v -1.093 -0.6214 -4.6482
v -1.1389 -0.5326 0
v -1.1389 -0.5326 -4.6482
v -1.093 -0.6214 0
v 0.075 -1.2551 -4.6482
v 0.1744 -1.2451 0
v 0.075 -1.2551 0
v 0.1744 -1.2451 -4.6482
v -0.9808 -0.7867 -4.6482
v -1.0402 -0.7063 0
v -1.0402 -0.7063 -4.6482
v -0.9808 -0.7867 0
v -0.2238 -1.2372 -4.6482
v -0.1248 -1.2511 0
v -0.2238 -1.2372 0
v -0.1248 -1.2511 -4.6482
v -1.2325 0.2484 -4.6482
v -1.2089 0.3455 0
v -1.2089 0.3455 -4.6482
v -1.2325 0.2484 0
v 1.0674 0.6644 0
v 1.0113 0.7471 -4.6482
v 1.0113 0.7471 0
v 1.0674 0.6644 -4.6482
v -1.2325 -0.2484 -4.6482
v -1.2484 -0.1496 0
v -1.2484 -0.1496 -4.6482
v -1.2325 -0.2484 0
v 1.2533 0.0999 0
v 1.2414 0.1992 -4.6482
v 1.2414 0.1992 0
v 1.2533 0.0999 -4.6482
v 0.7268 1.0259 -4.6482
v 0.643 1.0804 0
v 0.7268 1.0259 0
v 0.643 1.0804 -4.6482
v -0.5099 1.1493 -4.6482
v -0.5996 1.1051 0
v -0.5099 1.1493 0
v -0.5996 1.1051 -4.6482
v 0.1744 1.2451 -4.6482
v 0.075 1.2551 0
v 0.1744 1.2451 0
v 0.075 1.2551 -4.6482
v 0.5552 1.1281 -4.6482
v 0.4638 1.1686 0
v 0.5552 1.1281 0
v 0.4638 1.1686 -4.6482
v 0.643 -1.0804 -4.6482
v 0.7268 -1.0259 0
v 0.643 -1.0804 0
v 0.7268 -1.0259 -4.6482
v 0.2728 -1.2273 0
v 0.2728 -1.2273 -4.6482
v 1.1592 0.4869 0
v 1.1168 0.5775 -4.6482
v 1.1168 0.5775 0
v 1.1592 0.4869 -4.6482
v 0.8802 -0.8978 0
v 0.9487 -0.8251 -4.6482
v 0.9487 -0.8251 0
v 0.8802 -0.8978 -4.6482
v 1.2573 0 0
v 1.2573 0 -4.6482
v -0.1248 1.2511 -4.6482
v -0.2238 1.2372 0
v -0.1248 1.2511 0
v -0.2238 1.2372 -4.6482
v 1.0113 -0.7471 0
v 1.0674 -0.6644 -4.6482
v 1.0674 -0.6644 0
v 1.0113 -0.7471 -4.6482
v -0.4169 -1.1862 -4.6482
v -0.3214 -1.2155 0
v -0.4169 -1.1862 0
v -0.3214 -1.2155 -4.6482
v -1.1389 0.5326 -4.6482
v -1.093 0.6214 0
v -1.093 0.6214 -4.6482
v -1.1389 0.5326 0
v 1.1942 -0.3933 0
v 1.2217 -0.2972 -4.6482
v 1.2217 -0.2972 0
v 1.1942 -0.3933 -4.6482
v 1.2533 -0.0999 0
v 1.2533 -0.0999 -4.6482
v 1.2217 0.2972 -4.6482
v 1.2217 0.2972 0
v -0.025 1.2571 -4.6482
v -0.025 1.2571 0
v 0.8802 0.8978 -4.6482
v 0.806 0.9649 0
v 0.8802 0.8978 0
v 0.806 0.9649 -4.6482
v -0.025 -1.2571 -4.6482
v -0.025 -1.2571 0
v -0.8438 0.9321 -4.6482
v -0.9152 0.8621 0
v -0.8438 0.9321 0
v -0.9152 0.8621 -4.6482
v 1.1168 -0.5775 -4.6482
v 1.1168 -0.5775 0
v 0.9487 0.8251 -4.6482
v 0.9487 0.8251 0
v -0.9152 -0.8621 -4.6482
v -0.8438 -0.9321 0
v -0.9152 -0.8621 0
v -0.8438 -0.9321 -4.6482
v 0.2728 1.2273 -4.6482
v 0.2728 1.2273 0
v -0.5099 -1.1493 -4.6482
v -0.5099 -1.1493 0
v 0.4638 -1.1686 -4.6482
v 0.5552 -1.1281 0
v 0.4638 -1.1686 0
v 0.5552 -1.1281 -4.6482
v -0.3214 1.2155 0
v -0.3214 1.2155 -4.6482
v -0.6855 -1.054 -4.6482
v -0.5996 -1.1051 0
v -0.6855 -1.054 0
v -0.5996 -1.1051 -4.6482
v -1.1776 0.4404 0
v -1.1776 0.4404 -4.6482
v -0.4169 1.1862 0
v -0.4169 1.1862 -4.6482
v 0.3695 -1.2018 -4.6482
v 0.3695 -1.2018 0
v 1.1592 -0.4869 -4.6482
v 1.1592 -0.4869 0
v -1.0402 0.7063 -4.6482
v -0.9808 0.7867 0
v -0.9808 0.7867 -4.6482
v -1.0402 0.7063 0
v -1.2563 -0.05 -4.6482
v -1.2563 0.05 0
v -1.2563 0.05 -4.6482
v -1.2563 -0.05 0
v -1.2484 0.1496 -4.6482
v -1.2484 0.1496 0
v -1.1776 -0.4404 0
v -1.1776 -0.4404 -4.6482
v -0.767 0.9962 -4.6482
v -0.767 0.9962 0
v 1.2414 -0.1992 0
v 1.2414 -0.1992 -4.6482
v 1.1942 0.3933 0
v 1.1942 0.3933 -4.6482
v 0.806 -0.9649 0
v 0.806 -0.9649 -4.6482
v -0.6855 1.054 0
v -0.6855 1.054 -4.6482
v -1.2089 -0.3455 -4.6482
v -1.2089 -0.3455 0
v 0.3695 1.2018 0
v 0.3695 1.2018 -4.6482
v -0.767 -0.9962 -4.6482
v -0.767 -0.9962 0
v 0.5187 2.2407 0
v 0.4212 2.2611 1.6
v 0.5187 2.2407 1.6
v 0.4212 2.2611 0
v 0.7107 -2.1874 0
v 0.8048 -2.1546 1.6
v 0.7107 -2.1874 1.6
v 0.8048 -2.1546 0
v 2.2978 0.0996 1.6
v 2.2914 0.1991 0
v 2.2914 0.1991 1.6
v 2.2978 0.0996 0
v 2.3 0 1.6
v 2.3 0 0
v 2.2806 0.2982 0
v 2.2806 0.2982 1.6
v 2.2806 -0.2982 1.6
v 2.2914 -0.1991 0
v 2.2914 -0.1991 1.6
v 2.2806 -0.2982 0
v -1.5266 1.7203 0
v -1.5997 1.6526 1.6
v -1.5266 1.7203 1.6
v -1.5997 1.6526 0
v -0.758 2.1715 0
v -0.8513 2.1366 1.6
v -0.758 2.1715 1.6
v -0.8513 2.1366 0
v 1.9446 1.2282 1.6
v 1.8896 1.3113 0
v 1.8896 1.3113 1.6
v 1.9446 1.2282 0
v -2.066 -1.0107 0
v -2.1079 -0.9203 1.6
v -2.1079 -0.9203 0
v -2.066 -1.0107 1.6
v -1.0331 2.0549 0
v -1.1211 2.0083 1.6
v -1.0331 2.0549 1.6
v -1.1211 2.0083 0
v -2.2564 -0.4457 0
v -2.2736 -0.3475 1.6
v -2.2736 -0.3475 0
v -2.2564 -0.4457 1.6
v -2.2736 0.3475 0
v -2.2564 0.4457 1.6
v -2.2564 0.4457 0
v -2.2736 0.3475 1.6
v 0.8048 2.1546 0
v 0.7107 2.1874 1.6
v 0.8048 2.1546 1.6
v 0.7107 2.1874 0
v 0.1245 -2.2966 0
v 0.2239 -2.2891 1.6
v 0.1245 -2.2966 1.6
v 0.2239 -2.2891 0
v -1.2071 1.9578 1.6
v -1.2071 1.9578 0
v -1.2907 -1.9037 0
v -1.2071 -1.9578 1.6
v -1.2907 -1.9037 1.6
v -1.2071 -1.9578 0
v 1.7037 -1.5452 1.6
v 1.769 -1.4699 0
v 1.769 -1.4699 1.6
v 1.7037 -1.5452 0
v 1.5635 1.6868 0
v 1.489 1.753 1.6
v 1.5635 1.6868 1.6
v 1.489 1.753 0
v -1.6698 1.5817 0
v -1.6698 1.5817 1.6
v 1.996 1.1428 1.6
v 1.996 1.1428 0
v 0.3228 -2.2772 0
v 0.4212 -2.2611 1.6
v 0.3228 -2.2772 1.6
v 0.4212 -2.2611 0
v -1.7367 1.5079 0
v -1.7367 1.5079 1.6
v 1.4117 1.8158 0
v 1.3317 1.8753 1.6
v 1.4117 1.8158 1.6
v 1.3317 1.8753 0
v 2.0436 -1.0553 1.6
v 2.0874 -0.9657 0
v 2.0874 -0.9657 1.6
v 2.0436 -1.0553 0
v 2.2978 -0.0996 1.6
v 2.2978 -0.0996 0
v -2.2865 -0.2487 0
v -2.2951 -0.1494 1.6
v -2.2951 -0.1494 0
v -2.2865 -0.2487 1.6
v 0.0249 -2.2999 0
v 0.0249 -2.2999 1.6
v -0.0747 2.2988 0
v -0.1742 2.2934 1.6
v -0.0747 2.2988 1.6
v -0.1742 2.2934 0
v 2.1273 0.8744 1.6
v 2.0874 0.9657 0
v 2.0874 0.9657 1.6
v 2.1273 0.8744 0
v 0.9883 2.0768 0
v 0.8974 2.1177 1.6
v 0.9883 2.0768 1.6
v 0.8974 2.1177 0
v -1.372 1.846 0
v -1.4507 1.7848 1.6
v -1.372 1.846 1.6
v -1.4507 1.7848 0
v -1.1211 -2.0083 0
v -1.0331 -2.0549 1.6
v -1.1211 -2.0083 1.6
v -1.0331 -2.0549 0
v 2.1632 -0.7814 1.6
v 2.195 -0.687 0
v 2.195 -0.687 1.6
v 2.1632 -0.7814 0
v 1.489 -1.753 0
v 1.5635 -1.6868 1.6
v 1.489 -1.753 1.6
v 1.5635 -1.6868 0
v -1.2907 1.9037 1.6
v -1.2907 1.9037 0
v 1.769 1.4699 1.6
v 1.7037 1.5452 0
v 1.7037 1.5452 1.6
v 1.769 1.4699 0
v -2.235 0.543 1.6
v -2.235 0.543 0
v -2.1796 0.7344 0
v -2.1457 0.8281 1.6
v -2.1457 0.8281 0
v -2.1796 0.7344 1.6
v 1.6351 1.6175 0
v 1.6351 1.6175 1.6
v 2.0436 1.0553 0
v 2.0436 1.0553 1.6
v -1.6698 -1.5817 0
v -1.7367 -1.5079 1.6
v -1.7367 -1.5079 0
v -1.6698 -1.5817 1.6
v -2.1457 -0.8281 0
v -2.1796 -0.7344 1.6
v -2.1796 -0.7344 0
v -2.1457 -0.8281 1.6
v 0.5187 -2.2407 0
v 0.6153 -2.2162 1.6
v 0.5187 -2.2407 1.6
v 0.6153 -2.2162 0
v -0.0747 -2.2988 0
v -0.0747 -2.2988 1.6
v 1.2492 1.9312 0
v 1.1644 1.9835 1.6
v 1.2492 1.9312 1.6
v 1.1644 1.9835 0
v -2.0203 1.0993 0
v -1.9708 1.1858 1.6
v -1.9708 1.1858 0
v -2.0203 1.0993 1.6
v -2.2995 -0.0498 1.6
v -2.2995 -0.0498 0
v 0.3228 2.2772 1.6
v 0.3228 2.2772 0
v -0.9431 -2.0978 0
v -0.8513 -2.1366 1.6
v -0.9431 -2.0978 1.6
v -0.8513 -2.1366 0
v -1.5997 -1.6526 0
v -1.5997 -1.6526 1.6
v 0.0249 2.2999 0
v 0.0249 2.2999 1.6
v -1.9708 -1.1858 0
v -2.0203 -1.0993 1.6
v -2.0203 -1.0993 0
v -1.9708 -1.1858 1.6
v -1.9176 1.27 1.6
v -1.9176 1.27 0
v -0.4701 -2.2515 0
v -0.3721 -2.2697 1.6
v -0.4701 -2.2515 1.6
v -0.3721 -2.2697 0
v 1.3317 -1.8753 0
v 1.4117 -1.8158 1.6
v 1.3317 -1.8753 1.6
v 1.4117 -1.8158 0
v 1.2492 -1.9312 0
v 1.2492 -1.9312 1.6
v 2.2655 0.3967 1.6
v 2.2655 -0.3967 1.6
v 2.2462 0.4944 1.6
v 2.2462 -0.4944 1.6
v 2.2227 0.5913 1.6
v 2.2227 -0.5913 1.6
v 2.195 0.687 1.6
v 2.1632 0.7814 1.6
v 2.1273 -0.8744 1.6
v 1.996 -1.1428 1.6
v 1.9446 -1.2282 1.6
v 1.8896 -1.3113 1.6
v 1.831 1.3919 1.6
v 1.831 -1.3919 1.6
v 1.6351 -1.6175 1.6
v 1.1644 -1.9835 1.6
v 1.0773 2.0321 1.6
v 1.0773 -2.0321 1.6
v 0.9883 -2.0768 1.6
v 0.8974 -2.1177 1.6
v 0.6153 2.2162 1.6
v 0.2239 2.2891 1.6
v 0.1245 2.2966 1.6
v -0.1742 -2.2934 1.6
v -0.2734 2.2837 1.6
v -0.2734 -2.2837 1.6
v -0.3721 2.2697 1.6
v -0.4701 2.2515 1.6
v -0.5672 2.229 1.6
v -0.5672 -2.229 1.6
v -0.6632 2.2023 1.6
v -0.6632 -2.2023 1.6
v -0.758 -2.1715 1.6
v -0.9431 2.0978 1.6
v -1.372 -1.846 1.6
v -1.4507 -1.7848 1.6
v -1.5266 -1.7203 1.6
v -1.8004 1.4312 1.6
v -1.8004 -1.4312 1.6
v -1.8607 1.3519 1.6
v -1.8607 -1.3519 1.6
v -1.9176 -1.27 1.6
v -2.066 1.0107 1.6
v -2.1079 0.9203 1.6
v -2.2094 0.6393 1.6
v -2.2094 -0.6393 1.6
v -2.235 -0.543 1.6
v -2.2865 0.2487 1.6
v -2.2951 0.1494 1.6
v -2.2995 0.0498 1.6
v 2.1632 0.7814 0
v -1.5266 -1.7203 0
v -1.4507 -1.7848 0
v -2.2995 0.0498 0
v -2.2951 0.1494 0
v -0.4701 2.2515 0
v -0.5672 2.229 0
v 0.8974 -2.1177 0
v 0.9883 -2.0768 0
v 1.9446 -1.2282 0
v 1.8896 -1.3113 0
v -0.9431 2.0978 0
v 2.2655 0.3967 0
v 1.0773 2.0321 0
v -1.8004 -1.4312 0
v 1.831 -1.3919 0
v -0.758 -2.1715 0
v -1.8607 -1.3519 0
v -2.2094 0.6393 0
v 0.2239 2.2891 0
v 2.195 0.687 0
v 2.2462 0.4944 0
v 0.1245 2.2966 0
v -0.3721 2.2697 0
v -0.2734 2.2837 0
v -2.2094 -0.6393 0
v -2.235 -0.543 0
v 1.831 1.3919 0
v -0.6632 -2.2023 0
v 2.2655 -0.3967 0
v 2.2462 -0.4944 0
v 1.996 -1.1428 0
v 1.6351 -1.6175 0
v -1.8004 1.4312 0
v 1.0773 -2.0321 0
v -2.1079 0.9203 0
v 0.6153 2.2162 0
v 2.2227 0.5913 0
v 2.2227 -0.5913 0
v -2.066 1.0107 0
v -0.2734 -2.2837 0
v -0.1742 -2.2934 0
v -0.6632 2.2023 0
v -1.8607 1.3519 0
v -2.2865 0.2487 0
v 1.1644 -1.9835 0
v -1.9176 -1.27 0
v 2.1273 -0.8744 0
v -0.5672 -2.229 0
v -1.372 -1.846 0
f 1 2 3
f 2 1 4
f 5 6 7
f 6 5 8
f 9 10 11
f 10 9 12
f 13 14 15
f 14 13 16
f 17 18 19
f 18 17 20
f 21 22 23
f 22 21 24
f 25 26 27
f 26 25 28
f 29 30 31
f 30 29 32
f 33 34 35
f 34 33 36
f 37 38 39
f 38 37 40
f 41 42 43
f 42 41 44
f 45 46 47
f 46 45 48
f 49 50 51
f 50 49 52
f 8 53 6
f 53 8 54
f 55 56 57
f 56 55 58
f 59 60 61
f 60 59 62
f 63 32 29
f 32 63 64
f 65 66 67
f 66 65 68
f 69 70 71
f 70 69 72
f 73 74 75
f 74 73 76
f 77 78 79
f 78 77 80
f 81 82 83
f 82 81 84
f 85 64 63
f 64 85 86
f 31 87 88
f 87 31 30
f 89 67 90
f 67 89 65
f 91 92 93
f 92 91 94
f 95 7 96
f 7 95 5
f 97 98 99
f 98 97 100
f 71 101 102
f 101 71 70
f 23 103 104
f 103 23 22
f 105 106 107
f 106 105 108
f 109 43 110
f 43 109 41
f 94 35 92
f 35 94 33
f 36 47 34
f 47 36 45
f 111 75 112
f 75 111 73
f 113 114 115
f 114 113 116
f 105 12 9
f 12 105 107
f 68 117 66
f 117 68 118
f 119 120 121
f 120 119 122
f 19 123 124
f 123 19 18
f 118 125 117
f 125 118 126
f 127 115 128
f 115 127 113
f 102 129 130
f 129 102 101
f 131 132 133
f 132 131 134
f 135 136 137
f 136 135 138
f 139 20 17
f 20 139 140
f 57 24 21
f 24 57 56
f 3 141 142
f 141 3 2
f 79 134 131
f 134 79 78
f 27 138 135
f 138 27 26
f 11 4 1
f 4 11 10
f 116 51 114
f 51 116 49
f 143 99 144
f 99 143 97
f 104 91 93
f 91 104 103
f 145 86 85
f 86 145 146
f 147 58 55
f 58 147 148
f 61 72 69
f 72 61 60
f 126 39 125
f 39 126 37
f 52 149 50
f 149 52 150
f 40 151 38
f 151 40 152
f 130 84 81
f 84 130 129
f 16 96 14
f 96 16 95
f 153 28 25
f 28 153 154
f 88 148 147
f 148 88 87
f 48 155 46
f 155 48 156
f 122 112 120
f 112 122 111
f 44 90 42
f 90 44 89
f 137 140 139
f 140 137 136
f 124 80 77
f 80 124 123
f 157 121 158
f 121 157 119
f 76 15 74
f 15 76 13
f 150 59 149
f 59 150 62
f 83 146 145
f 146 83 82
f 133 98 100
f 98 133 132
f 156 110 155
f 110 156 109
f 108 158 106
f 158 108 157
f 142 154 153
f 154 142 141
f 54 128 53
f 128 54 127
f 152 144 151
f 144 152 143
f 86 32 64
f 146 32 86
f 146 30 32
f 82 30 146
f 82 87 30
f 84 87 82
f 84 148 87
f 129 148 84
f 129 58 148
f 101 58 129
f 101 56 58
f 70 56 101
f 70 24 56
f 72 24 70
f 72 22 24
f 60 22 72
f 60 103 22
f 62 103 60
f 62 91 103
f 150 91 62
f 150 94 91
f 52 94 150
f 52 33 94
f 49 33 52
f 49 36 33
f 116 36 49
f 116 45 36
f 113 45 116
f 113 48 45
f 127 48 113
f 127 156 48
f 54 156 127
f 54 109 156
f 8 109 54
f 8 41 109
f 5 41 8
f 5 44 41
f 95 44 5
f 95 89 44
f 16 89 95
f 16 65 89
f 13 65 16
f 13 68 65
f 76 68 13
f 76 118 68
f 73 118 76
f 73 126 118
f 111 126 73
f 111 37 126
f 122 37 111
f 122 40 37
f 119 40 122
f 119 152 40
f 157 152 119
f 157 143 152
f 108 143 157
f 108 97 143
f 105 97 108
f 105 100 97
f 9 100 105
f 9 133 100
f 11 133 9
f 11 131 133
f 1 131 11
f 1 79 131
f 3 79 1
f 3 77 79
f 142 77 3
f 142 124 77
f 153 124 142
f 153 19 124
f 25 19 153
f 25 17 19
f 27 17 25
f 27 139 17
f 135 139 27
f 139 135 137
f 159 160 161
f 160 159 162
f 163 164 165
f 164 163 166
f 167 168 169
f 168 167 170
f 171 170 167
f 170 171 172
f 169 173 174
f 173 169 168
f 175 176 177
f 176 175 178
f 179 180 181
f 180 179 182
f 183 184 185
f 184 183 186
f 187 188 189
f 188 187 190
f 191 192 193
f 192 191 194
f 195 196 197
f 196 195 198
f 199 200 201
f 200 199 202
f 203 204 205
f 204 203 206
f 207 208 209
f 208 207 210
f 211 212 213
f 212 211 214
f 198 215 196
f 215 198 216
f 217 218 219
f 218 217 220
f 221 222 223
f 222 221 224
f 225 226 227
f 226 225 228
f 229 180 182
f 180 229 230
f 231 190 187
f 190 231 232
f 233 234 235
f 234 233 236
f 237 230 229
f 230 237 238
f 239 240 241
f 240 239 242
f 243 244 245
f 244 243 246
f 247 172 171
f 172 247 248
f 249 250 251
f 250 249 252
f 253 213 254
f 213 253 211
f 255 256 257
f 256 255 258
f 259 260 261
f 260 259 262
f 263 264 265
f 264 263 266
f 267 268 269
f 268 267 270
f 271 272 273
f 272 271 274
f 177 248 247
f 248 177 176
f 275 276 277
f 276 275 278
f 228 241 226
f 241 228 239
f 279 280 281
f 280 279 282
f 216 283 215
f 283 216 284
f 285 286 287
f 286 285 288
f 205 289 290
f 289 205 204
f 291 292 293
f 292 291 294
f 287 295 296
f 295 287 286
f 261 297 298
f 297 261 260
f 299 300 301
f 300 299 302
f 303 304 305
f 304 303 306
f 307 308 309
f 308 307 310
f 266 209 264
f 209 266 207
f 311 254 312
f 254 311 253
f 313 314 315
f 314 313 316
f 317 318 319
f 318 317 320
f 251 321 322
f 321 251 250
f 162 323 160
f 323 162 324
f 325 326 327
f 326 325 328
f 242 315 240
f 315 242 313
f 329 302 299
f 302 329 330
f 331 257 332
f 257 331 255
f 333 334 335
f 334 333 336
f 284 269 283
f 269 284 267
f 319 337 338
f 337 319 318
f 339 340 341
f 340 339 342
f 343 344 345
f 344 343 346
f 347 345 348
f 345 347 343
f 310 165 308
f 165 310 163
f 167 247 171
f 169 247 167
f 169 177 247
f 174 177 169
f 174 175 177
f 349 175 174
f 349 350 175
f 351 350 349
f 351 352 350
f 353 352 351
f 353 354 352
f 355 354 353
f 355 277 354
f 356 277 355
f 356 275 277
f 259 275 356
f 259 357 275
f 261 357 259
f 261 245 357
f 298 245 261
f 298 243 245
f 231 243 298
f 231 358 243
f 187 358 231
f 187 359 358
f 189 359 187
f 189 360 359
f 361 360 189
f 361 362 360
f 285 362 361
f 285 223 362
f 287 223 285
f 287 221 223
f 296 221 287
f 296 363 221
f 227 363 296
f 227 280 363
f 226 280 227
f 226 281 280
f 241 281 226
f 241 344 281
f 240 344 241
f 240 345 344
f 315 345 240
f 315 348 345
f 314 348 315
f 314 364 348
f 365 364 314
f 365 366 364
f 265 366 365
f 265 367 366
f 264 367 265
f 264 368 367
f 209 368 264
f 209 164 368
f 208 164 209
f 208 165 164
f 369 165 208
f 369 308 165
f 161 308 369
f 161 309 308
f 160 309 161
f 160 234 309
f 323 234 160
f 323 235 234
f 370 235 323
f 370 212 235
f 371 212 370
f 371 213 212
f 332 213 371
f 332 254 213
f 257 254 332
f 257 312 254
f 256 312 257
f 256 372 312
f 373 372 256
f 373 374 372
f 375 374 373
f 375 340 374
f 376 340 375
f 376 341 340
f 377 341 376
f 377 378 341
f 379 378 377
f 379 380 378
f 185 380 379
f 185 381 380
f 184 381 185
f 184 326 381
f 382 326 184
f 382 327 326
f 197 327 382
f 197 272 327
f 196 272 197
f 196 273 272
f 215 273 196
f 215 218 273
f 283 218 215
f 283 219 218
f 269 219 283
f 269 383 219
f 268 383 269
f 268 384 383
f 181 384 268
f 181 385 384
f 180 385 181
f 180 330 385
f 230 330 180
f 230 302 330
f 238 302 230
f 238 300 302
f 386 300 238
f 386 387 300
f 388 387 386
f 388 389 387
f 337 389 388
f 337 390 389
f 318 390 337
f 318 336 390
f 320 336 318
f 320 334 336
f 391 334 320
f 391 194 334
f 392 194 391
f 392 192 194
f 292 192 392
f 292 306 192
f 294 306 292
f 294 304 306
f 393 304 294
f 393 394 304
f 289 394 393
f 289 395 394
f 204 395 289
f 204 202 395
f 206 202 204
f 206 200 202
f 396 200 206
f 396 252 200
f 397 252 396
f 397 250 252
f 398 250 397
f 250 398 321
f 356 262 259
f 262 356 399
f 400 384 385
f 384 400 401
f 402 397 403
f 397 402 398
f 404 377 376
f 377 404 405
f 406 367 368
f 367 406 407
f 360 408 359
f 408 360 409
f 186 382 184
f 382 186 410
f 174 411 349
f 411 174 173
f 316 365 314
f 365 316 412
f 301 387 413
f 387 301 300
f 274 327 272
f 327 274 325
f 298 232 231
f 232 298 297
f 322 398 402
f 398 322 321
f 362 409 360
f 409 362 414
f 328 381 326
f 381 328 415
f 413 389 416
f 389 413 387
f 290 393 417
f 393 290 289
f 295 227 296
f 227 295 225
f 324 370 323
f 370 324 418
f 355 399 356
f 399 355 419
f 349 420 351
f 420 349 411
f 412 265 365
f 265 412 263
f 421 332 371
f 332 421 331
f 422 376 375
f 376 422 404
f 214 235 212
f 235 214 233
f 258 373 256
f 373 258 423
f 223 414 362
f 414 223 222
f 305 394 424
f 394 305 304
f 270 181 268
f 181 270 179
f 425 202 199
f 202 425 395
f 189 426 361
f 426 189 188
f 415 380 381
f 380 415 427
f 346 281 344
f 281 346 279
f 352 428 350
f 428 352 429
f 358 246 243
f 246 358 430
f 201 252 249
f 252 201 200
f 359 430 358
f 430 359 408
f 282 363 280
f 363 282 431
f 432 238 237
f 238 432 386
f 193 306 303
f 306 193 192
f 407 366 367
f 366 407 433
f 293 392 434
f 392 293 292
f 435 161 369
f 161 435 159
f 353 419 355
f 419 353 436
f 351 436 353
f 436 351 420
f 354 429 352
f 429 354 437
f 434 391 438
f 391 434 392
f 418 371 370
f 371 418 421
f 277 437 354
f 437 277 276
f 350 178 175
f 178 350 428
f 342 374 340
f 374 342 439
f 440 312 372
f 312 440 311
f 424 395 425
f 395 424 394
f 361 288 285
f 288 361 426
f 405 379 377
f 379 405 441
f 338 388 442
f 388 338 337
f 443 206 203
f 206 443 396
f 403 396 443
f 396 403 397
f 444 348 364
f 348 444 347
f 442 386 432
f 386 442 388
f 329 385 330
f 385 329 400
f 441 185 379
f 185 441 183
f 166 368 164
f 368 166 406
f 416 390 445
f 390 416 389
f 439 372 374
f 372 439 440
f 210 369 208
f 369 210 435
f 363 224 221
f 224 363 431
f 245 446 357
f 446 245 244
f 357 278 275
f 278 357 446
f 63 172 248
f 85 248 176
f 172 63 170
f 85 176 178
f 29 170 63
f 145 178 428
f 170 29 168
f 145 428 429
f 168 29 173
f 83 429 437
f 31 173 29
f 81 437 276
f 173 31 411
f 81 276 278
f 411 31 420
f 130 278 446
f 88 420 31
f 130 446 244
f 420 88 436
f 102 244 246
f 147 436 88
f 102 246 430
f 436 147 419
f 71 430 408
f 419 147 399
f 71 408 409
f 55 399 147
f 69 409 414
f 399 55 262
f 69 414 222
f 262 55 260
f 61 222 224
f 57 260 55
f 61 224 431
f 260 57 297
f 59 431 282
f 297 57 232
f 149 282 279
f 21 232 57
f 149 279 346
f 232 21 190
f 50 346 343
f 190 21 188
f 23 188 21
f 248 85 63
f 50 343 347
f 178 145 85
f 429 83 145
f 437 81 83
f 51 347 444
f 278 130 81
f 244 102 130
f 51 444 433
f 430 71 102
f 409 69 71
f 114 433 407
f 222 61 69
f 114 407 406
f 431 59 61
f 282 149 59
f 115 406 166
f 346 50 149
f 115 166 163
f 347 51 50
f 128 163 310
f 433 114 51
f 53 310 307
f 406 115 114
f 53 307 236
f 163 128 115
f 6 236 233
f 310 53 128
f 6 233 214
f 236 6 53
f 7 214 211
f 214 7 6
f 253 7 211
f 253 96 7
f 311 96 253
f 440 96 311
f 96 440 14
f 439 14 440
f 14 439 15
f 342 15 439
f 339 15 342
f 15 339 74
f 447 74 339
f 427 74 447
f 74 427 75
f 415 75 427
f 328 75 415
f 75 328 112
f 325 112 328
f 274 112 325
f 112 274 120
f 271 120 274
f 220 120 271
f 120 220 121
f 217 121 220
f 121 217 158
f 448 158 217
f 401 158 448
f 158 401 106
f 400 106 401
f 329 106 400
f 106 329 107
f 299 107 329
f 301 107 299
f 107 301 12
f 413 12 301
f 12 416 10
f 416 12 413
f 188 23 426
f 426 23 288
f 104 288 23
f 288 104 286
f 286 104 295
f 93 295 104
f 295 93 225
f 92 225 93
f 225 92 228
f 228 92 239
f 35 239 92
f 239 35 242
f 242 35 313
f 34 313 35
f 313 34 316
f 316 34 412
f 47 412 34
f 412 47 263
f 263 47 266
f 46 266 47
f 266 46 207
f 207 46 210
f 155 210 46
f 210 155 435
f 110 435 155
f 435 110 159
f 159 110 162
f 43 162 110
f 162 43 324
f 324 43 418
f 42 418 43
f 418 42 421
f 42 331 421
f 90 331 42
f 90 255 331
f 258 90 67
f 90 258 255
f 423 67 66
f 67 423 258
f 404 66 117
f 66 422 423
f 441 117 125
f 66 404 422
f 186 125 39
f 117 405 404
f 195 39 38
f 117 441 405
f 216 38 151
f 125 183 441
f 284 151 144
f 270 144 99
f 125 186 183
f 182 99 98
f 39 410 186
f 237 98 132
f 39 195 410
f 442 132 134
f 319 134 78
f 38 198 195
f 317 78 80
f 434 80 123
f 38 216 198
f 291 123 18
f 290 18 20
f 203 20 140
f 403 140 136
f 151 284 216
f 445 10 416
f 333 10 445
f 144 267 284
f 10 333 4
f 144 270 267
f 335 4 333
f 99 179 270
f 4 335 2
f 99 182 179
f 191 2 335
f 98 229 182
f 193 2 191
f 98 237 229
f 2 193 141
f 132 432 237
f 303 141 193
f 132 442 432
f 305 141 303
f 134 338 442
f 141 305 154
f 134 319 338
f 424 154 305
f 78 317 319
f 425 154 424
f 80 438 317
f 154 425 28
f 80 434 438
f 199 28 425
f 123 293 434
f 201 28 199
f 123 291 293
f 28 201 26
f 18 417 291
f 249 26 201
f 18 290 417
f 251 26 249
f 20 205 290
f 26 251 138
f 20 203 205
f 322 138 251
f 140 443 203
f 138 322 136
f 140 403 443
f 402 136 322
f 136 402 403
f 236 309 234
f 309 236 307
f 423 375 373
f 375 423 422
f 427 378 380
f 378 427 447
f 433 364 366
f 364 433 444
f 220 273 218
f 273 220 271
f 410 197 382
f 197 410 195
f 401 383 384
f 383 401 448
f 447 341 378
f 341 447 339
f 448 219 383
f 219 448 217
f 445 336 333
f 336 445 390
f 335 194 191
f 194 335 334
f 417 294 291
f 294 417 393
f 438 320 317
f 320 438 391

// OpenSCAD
// file: ../lib/common.scad
// Shared helpers for the AR turntable part models.
//
// Every part file holds a parameter table P. Each row is:
//   [id, description, value_mm, evidence, display_unit, source_or_how_to_check]
//
// Evidence codes:
//   F  factory document          O  owner report
//   C  community drawing         S  industry standard
//   D  design choice             M  measured for this repository
//   PH placeholder: chosen only so the model has a shape. It is NOT a
//      measurement. Replace it, and change the code, once it is measured.
// License: CC BY-SA 4.0. See LICENSE at the repository root.

IN = 25.4;      // one inch, in mm. All model geometry is in mm.
EPS = 0.01;     // overlap so boolean cuts do not leave zero-thickness skins
$fa = 2;
$fs = 0.1;

// Value of parameter `id` in table t.
function pv(t, id) = t[search([id], t)[0]][2];

// Print part data for cad/tools/build.py, which reads it from the console.
module emit(meta, params, dims = []) {
    echo(META = meta);
    for (row = params) echo(PARAM = row);
    for (row = dims) echo(DIM = row);
}

// Rounded rectangle prism: centered in XY, from z = 0 to z = h.
module rr_prism(l, w, h, r) {
    translate([-l / 2 + r, -w / 2, 0]) cube([l - 2 * r, w, h]);
    translate([-l / 2, -w / 2 + r, 0]) cube([l, w - 2 * r, h]);
    for (sx = [-1, 1], sy = [-1, 1])
        translate([sx * (l / 2 - r), sy * (w / 2 - r), 0]) cylinder(r = r, h = h);
}

// Slot along X: `c` is the distance between end-radius centers.
module slot_prism(c, w, h) {
    translate([-c / 2, -w / 2, 0]) cube([c, w, h]);
    for (sx = [-1, 1]) translate([sx * c / 2, 0, 0]) cylinder(d = w, h = h);
}
// main file
// XA/XB aluminum cartridge screw, lengths #1 to #4. A part to buy, not to machine.
// Thread and lengths are from the RDW hardware drawing, December 7, 2023:
// docs/originals/ar-headshell-hardware-rev-1.pdf
// Head size is not dimensioned there, so it is a placeholder.
// License: CC BY-SA 4.0. See LICENSE at the repository root.
include <../lib/common.scad>

variant = 1;   // 1, 2, 3, or 4
flat = false;

lengths = [0.183, 0.356, 0.462, 0.612];

P = [
    ["SC1", "Thread major diameter, #3-48", 0.099 * IN, "S", "in", "Unified #3 major diameter; thread called out on the RDW drawing"],
    ["SC2", "Length under head for this size", lengths[variant - 1] * IN, "C", "in", "RDW hardware drawing: 0.183, 0.356, 0.462, 0.612 in"],
    ["SC3", "Head diameter", 4.6, "PH", "mm", "Calipers on an original screw"],
    ["SC4", "Head height", 1.6, "PH", "mm", "Calipers on an original screw; note the head style and drive"],
];

d = pv(P, "SC1");
l = pv(P, "SC2");
hd = pv(P, "SC3");
hh = pv(P, "SC4");

module part() {
    translate([0, 0, -l]) cylinder(d = d, h = l + EPS);
    cylinder(d = hd, h = hh);
}

emit(
    [
        ["id", "cartridge-screw-3-48"],
        ["title", "XA/XB cartridge screw, #3-48"],
        ["status", "REFERENCE"],
        ["scope", "Original-style hardware. Reproduction shells may differ: Pat's Audio supplies M2.5"],
        ["material", "Aluminum, per the drawing"],
        ["density", 2.7],
        ["make", "Buy. Do not machine. 2 of each length per set"],
        ["variants", [[1, "#1, 0.183 in"], [2, "#2, 0.356 in"], [3, "#3, 0.462 in"], [4, "#4, 0.612 in"]]],
        ["views", ["front", "top", "right", "iso"]],
        ["notes", [
            "Thread is shown as a plain cylinder at major diameter. Specify #3-48 UNC when buying.",
            "The drive recess is not modeled.",
        ]],
    ],
    P,
    [
        ["front", "v", [d / 2, 0, -l], [d / 2, 0, 0], 8, "SC2"],
        ["front", "h", [-d / 2, 0, -l], [d / 2, 0, -l], -8, "SC1", "Ø"],
        ["front", "h", [-hd / 2, 0, hh], [hd / 2, 0, hh], 8, "SC3", "Ø"],
        ["front", "v", [-hd / 2, 0, 0], [-hd / 2, 0, hh], -8, "SC4"],
        ["front", "cl", [0, 0, -l - 0.4], [0, 0, hh + 0.4]],
    ]
);

if (flat) projection() part(); else part();
